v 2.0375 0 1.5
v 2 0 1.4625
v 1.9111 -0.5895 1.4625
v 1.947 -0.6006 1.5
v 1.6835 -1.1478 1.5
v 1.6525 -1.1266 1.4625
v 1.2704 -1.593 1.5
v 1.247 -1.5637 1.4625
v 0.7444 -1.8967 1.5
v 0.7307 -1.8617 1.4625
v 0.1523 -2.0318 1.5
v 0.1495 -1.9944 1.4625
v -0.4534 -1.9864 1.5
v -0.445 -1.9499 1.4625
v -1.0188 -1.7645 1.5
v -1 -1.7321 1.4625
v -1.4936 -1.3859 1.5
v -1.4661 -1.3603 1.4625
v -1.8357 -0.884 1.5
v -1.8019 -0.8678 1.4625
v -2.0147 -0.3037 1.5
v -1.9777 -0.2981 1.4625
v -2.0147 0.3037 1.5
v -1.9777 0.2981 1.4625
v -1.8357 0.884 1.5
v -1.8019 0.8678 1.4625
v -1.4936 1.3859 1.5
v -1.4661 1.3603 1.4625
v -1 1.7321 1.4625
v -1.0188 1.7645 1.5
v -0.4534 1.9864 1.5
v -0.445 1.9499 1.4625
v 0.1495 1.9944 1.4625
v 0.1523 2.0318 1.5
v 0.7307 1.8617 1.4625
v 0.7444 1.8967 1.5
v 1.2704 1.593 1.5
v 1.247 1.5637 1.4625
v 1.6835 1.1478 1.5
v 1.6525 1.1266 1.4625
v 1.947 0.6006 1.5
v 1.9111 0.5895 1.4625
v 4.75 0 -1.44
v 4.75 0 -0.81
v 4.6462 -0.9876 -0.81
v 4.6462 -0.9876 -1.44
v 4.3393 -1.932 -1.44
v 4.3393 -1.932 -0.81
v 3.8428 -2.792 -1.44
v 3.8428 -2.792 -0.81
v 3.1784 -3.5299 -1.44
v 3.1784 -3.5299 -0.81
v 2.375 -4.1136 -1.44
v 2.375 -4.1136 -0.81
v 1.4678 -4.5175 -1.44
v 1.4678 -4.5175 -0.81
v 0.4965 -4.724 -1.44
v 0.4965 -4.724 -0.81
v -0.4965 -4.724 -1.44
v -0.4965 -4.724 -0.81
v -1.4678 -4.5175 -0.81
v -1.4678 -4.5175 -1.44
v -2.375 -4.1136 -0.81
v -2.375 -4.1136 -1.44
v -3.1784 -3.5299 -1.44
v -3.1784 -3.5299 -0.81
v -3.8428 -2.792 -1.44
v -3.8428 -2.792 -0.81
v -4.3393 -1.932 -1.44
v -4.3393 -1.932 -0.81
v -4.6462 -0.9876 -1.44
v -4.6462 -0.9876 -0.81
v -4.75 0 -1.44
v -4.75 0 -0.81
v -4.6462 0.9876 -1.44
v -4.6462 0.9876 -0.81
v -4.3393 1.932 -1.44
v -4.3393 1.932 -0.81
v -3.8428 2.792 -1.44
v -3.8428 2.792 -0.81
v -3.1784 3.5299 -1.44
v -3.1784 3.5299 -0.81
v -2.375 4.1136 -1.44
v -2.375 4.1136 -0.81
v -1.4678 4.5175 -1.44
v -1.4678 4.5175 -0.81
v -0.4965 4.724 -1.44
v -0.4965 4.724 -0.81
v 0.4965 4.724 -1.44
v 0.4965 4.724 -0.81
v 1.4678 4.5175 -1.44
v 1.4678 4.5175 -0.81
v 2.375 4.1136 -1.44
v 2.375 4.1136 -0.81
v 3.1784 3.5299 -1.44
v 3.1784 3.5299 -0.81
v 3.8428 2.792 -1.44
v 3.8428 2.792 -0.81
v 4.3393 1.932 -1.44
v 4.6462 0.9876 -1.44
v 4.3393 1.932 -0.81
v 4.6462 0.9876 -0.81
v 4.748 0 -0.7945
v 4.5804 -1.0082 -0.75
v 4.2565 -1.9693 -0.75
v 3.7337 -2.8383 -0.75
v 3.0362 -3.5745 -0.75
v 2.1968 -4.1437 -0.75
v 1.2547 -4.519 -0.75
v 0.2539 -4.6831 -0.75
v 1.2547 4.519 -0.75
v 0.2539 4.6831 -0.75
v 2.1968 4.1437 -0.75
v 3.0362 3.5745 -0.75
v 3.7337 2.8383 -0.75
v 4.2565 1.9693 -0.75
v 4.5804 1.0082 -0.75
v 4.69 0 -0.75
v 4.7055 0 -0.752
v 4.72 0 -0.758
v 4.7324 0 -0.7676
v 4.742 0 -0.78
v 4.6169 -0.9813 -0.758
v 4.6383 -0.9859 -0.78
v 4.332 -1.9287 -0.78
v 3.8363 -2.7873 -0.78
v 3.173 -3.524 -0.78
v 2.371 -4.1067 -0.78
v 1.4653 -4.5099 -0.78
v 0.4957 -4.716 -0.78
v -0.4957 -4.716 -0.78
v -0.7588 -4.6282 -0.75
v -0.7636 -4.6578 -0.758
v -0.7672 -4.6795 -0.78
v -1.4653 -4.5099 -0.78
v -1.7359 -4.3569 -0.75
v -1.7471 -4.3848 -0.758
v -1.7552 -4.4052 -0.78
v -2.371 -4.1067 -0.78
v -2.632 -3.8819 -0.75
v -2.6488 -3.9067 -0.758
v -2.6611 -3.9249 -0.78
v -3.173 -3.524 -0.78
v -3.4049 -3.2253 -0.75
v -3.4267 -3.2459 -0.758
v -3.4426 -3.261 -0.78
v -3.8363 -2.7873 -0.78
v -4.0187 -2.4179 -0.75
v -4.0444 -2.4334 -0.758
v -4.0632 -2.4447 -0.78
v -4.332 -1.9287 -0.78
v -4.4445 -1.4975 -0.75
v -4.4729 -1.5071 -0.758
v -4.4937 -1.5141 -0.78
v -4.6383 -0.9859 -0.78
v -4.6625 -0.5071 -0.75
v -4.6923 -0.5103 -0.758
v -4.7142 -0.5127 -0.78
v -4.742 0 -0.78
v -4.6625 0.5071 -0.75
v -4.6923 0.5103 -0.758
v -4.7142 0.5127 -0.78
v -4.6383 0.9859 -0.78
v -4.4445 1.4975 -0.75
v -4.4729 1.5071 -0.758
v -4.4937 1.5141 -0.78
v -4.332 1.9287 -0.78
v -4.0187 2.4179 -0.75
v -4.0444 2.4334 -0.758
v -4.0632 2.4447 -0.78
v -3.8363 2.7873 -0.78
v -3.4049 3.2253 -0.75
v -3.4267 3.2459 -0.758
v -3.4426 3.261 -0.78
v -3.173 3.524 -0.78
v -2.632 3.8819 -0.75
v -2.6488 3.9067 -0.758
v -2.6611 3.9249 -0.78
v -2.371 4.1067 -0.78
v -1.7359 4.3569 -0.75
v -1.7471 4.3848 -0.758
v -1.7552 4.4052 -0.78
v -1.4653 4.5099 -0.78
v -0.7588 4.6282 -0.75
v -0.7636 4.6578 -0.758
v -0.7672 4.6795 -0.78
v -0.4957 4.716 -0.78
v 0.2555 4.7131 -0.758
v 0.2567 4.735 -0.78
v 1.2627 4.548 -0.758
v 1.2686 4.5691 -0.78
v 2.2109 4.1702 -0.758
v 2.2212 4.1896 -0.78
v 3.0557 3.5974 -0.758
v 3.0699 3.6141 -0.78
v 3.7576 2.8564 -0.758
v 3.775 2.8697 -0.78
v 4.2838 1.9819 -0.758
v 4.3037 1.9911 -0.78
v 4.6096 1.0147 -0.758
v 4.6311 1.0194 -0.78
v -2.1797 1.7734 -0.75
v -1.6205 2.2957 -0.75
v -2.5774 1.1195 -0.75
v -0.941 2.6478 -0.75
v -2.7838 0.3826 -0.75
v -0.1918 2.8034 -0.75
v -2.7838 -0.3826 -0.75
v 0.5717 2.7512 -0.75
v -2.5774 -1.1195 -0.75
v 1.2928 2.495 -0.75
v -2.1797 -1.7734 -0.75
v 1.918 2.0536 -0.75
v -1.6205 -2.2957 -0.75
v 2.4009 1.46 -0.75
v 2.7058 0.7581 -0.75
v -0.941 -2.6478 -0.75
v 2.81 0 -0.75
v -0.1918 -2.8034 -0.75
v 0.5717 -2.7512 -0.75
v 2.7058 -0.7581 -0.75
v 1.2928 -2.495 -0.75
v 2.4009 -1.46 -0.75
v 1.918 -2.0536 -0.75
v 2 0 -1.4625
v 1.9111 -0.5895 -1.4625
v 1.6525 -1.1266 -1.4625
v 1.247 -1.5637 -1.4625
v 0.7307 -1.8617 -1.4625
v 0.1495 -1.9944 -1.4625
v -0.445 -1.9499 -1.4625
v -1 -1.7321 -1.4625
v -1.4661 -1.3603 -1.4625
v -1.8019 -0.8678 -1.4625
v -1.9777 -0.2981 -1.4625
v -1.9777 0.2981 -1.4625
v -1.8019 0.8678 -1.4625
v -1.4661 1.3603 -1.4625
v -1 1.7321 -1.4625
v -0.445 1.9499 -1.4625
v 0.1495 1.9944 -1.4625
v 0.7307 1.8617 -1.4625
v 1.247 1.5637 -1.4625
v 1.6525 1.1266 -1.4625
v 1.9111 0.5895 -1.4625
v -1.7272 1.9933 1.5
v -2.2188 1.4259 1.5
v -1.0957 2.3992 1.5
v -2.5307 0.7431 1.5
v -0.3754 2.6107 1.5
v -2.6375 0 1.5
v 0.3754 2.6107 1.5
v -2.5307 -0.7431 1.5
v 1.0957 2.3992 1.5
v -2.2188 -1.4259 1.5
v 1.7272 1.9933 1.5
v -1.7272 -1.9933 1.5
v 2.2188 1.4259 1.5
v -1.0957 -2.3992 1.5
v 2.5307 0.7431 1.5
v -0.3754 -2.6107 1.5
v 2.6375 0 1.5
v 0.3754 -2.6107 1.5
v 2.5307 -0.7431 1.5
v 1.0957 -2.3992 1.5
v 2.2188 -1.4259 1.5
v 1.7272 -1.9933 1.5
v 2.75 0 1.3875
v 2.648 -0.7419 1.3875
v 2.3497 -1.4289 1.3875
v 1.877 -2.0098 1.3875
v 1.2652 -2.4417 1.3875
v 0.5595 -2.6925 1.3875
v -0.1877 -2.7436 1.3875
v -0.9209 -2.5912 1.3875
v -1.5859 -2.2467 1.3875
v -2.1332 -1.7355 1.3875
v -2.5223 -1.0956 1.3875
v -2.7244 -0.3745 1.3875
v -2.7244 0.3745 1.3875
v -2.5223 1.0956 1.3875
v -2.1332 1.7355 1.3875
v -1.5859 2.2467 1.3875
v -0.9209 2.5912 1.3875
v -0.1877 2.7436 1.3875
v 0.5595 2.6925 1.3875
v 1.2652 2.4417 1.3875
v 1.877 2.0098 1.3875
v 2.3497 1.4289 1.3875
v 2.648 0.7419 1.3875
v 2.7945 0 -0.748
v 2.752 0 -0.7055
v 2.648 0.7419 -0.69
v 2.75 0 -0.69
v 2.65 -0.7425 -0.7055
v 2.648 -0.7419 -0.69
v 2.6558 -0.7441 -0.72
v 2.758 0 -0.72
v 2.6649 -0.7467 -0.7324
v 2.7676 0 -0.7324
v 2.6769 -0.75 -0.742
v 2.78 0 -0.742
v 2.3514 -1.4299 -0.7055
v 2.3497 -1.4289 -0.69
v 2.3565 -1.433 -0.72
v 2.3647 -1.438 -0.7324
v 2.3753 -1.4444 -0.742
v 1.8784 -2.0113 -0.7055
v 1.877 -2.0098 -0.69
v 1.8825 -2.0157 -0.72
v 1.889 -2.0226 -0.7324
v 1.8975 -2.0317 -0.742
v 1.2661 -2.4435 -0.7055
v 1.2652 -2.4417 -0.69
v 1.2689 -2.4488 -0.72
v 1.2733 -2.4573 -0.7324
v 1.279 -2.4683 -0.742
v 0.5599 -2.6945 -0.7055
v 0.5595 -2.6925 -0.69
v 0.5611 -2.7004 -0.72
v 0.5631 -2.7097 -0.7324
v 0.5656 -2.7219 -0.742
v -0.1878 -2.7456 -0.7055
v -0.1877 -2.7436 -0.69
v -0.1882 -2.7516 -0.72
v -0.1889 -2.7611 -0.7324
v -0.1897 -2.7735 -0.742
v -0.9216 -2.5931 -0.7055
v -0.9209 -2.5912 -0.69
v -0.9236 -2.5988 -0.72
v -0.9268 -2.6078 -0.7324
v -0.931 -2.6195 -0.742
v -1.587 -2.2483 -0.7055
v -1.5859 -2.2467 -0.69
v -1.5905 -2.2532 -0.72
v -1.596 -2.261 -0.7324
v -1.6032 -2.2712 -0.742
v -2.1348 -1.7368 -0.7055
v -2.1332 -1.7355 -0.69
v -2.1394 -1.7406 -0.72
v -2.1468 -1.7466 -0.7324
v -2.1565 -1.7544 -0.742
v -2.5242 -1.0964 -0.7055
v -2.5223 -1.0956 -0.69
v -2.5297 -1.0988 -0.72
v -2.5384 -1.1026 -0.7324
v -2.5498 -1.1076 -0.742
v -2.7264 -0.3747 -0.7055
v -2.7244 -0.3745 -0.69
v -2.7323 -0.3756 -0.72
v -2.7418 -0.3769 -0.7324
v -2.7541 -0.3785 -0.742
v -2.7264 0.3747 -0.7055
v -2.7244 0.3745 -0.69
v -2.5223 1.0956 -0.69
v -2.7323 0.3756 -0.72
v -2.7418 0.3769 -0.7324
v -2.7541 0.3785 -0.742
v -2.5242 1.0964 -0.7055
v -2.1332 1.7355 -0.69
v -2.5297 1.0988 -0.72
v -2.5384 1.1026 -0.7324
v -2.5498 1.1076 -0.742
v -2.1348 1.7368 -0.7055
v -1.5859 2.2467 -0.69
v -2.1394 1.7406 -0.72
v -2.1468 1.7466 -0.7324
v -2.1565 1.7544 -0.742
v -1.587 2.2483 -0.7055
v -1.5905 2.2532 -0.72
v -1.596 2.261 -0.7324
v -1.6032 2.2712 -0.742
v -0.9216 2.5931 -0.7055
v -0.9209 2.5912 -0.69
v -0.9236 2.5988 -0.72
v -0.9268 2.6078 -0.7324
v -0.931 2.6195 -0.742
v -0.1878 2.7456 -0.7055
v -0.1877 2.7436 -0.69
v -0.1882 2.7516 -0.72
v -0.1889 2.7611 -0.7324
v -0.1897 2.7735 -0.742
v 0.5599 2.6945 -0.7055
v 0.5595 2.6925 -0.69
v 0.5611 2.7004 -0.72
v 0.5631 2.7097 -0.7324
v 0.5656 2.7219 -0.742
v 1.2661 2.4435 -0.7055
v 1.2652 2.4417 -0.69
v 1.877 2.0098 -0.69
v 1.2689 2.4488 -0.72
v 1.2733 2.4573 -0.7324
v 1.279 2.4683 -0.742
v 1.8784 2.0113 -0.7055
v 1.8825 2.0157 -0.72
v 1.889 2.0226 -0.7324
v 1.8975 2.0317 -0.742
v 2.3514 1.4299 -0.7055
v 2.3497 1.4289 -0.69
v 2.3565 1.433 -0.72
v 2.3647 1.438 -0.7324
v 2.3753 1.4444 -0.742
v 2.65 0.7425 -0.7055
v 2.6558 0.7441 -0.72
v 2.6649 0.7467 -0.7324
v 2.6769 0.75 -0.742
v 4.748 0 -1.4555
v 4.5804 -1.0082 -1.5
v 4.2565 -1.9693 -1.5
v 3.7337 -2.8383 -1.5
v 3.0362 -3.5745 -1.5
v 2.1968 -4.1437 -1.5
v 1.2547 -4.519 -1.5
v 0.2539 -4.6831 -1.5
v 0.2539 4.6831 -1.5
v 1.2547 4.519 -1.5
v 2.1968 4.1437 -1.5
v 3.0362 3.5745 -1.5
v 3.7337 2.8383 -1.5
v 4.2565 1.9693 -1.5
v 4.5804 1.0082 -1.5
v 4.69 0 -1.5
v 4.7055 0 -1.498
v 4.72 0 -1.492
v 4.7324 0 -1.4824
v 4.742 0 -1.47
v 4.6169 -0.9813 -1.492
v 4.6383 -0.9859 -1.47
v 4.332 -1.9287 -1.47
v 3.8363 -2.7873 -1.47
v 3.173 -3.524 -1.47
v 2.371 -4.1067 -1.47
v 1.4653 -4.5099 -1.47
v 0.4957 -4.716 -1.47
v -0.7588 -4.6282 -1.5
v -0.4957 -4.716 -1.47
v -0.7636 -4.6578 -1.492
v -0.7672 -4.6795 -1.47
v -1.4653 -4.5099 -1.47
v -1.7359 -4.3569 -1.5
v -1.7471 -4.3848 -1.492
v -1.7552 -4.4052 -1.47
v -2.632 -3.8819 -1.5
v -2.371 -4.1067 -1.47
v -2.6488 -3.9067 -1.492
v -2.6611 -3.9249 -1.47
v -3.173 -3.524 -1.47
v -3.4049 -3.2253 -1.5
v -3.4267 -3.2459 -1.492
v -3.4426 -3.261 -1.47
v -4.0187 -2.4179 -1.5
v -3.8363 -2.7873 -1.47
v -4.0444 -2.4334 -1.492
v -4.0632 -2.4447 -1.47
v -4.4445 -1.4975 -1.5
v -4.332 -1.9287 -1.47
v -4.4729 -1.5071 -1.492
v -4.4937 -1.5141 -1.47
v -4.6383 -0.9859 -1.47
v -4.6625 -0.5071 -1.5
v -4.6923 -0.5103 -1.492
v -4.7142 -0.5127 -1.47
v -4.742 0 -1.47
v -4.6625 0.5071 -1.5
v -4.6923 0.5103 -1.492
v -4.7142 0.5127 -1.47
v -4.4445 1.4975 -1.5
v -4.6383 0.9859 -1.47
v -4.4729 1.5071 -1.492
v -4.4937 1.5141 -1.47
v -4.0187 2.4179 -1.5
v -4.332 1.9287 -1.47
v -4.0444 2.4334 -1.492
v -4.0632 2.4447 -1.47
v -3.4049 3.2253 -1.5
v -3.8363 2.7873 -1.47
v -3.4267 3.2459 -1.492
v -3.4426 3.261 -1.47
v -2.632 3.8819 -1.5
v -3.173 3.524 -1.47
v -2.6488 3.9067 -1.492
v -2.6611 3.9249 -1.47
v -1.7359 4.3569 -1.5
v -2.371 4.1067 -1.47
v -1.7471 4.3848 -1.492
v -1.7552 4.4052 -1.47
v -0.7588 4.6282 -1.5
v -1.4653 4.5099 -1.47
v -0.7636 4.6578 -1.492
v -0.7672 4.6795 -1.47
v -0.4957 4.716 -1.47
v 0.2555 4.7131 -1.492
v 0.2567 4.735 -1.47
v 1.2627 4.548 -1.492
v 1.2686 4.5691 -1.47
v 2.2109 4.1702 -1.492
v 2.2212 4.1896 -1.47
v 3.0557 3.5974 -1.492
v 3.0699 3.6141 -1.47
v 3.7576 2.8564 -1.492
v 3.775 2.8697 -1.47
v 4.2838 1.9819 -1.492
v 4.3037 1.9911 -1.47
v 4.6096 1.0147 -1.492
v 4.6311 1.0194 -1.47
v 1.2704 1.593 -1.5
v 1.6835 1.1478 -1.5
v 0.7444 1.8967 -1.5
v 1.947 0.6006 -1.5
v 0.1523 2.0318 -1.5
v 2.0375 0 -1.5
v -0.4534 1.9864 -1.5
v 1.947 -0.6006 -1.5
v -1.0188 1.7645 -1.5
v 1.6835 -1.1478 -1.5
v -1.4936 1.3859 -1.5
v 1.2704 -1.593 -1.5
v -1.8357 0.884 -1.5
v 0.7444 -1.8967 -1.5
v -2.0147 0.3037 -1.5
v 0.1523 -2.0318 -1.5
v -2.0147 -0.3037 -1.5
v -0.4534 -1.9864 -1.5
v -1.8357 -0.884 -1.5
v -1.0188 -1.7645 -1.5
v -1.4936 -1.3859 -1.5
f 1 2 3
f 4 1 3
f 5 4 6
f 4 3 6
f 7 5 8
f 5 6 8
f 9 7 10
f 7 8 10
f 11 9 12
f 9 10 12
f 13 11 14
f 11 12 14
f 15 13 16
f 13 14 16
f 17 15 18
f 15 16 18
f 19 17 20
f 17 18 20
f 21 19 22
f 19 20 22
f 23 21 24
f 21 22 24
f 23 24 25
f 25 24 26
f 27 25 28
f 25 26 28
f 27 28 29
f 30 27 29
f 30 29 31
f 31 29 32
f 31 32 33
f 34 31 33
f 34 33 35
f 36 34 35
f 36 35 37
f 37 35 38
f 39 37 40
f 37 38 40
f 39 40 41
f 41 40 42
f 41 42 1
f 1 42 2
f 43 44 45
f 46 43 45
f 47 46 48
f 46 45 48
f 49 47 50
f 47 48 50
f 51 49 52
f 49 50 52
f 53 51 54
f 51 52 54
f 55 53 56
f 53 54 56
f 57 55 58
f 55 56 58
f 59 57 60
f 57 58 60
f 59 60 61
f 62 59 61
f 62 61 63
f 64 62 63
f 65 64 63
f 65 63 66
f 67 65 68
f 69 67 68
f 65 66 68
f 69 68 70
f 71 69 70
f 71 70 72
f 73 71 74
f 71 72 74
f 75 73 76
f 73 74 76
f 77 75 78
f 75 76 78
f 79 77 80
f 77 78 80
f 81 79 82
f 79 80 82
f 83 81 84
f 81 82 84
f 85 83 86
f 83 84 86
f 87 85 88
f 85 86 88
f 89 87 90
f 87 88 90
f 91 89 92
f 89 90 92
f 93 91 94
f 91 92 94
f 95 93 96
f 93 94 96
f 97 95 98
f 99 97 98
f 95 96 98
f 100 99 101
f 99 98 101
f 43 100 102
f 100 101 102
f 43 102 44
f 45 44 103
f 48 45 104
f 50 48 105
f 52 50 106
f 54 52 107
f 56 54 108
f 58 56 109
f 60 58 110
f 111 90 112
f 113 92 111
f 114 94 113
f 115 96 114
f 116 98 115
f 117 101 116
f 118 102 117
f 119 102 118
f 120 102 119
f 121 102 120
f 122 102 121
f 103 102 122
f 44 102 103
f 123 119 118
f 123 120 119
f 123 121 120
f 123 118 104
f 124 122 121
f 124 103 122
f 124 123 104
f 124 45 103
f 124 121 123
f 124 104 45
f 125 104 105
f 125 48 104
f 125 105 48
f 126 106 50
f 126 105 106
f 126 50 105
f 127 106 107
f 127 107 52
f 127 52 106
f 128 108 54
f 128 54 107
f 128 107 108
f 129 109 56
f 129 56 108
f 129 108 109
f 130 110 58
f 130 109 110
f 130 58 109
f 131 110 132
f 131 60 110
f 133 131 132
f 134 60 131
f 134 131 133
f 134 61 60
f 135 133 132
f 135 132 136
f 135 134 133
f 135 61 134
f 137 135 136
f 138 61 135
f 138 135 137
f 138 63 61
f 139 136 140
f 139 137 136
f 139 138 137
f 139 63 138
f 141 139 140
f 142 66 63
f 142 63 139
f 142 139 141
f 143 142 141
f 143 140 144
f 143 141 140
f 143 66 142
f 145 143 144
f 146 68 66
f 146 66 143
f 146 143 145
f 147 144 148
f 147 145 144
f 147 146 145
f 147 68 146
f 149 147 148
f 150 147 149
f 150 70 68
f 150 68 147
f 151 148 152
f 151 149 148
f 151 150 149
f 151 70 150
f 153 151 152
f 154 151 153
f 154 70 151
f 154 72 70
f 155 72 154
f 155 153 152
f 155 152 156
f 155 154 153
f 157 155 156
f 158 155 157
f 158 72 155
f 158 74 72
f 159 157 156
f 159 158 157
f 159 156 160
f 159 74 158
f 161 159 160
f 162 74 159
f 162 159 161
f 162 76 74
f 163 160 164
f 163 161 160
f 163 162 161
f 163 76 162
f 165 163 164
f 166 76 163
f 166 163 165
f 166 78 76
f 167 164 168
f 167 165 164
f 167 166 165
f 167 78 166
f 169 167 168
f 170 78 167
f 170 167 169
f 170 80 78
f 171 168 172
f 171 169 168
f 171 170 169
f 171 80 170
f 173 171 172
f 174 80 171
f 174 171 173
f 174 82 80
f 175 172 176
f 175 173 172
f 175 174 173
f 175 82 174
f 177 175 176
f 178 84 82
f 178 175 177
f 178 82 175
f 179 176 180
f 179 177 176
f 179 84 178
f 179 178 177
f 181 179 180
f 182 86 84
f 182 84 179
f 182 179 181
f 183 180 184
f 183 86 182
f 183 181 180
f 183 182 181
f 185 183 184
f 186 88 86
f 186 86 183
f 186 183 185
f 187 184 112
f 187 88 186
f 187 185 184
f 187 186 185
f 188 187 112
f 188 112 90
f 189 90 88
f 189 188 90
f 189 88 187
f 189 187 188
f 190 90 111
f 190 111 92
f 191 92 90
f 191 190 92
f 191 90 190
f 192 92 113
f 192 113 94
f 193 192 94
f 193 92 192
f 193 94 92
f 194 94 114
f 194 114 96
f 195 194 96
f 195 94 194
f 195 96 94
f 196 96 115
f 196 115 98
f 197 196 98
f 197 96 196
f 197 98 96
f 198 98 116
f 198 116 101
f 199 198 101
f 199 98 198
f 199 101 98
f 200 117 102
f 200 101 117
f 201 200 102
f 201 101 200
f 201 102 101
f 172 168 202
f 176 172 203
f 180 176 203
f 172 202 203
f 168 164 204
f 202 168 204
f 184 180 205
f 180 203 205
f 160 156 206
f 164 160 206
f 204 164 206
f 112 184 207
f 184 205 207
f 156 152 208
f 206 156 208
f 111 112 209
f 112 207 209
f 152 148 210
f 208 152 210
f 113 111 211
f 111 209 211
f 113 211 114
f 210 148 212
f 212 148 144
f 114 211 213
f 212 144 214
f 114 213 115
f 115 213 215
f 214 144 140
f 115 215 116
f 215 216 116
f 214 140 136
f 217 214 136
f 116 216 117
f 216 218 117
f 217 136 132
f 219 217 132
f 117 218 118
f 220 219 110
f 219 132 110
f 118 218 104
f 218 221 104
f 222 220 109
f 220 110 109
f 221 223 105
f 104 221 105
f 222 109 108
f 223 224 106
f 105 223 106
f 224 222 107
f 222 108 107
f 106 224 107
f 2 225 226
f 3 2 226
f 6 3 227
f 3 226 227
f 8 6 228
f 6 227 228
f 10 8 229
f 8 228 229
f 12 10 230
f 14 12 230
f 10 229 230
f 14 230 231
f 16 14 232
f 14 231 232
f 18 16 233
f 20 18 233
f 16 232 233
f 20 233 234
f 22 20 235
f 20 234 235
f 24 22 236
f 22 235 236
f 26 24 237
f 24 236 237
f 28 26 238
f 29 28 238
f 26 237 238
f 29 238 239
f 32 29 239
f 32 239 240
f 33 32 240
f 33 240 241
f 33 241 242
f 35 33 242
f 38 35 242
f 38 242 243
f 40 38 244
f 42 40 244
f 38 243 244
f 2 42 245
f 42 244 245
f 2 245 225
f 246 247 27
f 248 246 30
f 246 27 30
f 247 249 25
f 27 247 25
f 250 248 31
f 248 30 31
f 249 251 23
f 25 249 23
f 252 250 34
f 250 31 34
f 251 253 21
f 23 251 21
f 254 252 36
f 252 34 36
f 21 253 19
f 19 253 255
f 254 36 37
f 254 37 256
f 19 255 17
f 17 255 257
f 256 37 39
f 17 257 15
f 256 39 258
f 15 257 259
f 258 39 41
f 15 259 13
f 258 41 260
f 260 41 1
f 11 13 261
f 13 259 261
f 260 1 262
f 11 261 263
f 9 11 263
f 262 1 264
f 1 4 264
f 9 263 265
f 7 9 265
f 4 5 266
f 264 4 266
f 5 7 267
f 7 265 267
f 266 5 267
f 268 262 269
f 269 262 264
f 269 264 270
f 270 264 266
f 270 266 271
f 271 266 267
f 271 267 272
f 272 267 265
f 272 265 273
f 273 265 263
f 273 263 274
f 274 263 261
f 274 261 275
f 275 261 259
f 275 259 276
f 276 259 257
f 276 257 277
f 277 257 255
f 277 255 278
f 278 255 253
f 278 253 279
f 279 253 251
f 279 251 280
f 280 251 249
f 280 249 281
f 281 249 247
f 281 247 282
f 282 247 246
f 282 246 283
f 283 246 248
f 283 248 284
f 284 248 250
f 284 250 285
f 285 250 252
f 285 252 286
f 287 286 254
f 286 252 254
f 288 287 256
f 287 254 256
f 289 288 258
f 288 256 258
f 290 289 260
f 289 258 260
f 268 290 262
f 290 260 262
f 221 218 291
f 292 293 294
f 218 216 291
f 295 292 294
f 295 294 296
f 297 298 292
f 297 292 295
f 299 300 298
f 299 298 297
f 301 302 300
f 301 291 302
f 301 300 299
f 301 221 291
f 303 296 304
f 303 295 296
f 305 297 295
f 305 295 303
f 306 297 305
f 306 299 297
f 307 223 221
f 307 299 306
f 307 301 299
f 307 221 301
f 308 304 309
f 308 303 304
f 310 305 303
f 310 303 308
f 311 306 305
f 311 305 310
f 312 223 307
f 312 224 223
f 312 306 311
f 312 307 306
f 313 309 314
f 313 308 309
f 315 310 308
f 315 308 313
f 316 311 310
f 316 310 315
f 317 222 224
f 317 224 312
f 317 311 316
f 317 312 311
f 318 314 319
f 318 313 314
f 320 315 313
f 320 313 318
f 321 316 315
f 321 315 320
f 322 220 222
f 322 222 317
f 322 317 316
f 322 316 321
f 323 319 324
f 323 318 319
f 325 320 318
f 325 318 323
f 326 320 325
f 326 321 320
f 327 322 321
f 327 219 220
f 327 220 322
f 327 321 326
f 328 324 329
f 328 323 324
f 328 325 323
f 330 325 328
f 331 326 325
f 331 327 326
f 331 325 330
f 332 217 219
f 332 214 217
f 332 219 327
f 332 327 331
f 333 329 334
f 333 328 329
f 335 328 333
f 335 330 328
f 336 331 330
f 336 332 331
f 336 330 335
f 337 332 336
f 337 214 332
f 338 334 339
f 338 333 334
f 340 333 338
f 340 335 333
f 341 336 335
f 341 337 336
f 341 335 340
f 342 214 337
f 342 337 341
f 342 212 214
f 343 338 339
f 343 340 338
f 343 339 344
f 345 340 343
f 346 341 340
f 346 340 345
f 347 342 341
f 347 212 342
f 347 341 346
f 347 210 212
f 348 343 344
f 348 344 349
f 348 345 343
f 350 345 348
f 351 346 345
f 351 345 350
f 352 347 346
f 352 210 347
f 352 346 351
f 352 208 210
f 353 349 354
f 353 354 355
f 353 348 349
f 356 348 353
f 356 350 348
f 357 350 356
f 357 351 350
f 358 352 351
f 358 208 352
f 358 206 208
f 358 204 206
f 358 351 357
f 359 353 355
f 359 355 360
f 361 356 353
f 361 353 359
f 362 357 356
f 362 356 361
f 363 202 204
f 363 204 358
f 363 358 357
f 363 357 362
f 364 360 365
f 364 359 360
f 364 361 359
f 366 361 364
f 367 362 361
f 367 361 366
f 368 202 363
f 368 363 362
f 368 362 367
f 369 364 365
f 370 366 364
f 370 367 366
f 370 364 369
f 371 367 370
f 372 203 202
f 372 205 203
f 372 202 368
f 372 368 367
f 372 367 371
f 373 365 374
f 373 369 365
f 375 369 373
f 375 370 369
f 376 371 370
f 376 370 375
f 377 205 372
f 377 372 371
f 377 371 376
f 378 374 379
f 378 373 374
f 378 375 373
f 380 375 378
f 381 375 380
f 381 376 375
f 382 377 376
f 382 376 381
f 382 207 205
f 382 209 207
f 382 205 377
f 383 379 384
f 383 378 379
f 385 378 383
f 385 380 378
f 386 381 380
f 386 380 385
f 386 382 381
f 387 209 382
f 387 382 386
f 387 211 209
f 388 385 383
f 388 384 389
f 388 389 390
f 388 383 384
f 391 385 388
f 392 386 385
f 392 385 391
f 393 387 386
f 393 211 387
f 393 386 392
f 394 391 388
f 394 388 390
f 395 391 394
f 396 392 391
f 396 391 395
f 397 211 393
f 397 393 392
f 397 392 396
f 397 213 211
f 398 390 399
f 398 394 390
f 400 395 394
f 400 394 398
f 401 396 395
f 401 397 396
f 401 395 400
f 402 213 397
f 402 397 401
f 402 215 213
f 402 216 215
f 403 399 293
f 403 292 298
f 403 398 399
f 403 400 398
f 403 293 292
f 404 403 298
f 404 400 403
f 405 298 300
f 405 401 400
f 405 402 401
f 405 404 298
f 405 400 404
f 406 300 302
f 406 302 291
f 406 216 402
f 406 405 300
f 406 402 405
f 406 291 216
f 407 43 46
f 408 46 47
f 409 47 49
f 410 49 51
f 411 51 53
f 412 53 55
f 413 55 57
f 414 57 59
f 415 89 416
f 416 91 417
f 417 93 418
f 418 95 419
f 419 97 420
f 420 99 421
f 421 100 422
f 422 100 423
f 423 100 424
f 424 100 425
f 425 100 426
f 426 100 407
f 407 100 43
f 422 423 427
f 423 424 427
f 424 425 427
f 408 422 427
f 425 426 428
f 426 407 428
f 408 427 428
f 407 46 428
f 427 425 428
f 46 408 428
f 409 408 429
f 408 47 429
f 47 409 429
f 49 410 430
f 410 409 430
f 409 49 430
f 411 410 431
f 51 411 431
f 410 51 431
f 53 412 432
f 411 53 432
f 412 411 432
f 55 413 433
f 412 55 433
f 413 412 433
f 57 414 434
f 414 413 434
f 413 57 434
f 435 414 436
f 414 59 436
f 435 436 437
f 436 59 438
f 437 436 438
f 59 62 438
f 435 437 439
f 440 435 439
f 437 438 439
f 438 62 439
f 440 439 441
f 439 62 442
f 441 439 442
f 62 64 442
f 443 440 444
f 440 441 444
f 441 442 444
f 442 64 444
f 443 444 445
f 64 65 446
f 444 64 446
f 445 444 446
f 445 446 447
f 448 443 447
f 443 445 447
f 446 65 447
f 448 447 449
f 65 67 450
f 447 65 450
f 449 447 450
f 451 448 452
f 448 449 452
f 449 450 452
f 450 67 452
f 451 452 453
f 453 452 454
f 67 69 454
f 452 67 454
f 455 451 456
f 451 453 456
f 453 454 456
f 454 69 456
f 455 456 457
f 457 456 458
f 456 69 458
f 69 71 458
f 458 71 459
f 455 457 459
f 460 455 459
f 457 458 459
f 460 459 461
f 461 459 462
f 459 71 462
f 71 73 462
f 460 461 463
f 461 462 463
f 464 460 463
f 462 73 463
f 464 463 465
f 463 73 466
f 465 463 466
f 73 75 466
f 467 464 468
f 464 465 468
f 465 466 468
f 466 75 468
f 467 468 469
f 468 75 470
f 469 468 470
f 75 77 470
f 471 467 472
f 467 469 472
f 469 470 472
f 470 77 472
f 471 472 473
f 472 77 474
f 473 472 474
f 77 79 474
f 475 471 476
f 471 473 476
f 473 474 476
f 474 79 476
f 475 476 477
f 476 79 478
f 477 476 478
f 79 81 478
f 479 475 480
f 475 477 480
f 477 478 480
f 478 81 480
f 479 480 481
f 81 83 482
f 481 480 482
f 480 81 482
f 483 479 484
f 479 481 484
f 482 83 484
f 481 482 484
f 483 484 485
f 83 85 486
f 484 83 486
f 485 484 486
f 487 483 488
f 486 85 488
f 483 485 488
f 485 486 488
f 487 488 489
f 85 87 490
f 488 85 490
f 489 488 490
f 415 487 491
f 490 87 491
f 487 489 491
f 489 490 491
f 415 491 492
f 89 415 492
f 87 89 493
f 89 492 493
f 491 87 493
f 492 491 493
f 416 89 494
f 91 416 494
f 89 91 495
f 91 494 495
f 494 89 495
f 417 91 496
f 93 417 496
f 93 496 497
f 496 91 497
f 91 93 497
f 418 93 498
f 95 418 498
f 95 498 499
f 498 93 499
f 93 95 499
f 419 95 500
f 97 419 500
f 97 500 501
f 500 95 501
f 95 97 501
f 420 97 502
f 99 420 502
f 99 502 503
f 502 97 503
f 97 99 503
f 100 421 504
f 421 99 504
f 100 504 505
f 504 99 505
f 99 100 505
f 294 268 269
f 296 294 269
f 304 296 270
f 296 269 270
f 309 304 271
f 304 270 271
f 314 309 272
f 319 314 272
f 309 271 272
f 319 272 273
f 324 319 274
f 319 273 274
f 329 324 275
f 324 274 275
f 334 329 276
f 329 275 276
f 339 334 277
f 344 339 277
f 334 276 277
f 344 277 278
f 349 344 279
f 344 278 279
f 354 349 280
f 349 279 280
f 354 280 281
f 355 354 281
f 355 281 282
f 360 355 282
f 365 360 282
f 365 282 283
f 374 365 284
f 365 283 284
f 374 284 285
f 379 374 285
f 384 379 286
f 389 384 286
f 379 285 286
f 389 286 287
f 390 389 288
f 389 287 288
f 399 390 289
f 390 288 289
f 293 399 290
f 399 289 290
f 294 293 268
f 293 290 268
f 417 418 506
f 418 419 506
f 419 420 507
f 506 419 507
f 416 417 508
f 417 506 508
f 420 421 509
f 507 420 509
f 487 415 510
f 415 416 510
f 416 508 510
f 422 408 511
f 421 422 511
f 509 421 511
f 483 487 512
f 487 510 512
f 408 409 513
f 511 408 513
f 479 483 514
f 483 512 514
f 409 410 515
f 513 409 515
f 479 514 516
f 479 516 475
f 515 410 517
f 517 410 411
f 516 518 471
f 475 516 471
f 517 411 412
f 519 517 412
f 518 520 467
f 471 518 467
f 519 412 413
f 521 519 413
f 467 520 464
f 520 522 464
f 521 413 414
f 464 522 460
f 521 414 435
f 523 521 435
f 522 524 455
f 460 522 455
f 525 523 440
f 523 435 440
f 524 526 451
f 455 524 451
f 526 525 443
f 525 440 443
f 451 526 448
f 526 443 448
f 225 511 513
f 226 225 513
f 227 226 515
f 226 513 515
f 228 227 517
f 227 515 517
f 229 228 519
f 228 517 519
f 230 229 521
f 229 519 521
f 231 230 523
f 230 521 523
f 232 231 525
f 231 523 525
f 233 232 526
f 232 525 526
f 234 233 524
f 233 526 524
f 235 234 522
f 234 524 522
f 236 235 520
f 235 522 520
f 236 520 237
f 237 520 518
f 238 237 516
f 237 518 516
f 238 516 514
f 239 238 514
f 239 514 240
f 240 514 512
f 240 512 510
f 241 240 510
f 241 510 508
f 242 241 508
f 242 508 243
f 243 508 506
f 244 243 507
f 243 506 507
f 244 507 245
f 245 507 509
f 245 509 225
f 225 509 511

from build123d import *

# Parameters (mm, degrees)
CHAMFER1_SIZE = 0.1125
CHAMFER2_SIZE = 0.0375
FILLET1_R     = 0.06


with BuildPart() as part:
    # Sketch3 → Revolve1 (revolve)
    with BuildSketch(Plane(origin=(0, 0, 0), x_dir=(0, 0, -1), z_dir=(1, 0, 0)), mode=Mode.PRIVATE) as revolve1_sk:
        Polygon((1.5, -4.75), (0.75, -4.75), (0.75, -2.75), (-1.5, -2.75), (-1.5, -2), (1.5, -2), align=None)
    revolve(revolve1_sk.sketch.rotate(Axis((0, 0, 1.5), (0, 0, -1)), 270), axis=Axis((0, 0, 1.5), (0, 0, -1)))

    # Chamfer1
    chamfer1_edges = [part.edges().sort_by_distance(p)[0] for p in [
        (-2.75, 0, 1.5),
    ]]
    chamfer(chamfer1_edges, length=CHAMFER1_SIZE)

    # Chamfer2
    chamfer2_edges = [part.edges().sort_by_distance(p)[0] for p in [
        (-2, 0, -1.5),
        (-2, 0, 1.5),
    ]]
    chamfer(chamfer2_edges, length=CHAMFER2_SIZE)

    # Fillet1
    fillet1_edges = [part.edges().sort_by_distance(p)[0] for p in [
        (-2.75, 0, -0.75),
        (-4.75, 0, -0.75),
        (-4.75, 0, -1.5),
    ]]
    fillet(fillet1_edges, radius=FILLET1_R)


solid = part.part
